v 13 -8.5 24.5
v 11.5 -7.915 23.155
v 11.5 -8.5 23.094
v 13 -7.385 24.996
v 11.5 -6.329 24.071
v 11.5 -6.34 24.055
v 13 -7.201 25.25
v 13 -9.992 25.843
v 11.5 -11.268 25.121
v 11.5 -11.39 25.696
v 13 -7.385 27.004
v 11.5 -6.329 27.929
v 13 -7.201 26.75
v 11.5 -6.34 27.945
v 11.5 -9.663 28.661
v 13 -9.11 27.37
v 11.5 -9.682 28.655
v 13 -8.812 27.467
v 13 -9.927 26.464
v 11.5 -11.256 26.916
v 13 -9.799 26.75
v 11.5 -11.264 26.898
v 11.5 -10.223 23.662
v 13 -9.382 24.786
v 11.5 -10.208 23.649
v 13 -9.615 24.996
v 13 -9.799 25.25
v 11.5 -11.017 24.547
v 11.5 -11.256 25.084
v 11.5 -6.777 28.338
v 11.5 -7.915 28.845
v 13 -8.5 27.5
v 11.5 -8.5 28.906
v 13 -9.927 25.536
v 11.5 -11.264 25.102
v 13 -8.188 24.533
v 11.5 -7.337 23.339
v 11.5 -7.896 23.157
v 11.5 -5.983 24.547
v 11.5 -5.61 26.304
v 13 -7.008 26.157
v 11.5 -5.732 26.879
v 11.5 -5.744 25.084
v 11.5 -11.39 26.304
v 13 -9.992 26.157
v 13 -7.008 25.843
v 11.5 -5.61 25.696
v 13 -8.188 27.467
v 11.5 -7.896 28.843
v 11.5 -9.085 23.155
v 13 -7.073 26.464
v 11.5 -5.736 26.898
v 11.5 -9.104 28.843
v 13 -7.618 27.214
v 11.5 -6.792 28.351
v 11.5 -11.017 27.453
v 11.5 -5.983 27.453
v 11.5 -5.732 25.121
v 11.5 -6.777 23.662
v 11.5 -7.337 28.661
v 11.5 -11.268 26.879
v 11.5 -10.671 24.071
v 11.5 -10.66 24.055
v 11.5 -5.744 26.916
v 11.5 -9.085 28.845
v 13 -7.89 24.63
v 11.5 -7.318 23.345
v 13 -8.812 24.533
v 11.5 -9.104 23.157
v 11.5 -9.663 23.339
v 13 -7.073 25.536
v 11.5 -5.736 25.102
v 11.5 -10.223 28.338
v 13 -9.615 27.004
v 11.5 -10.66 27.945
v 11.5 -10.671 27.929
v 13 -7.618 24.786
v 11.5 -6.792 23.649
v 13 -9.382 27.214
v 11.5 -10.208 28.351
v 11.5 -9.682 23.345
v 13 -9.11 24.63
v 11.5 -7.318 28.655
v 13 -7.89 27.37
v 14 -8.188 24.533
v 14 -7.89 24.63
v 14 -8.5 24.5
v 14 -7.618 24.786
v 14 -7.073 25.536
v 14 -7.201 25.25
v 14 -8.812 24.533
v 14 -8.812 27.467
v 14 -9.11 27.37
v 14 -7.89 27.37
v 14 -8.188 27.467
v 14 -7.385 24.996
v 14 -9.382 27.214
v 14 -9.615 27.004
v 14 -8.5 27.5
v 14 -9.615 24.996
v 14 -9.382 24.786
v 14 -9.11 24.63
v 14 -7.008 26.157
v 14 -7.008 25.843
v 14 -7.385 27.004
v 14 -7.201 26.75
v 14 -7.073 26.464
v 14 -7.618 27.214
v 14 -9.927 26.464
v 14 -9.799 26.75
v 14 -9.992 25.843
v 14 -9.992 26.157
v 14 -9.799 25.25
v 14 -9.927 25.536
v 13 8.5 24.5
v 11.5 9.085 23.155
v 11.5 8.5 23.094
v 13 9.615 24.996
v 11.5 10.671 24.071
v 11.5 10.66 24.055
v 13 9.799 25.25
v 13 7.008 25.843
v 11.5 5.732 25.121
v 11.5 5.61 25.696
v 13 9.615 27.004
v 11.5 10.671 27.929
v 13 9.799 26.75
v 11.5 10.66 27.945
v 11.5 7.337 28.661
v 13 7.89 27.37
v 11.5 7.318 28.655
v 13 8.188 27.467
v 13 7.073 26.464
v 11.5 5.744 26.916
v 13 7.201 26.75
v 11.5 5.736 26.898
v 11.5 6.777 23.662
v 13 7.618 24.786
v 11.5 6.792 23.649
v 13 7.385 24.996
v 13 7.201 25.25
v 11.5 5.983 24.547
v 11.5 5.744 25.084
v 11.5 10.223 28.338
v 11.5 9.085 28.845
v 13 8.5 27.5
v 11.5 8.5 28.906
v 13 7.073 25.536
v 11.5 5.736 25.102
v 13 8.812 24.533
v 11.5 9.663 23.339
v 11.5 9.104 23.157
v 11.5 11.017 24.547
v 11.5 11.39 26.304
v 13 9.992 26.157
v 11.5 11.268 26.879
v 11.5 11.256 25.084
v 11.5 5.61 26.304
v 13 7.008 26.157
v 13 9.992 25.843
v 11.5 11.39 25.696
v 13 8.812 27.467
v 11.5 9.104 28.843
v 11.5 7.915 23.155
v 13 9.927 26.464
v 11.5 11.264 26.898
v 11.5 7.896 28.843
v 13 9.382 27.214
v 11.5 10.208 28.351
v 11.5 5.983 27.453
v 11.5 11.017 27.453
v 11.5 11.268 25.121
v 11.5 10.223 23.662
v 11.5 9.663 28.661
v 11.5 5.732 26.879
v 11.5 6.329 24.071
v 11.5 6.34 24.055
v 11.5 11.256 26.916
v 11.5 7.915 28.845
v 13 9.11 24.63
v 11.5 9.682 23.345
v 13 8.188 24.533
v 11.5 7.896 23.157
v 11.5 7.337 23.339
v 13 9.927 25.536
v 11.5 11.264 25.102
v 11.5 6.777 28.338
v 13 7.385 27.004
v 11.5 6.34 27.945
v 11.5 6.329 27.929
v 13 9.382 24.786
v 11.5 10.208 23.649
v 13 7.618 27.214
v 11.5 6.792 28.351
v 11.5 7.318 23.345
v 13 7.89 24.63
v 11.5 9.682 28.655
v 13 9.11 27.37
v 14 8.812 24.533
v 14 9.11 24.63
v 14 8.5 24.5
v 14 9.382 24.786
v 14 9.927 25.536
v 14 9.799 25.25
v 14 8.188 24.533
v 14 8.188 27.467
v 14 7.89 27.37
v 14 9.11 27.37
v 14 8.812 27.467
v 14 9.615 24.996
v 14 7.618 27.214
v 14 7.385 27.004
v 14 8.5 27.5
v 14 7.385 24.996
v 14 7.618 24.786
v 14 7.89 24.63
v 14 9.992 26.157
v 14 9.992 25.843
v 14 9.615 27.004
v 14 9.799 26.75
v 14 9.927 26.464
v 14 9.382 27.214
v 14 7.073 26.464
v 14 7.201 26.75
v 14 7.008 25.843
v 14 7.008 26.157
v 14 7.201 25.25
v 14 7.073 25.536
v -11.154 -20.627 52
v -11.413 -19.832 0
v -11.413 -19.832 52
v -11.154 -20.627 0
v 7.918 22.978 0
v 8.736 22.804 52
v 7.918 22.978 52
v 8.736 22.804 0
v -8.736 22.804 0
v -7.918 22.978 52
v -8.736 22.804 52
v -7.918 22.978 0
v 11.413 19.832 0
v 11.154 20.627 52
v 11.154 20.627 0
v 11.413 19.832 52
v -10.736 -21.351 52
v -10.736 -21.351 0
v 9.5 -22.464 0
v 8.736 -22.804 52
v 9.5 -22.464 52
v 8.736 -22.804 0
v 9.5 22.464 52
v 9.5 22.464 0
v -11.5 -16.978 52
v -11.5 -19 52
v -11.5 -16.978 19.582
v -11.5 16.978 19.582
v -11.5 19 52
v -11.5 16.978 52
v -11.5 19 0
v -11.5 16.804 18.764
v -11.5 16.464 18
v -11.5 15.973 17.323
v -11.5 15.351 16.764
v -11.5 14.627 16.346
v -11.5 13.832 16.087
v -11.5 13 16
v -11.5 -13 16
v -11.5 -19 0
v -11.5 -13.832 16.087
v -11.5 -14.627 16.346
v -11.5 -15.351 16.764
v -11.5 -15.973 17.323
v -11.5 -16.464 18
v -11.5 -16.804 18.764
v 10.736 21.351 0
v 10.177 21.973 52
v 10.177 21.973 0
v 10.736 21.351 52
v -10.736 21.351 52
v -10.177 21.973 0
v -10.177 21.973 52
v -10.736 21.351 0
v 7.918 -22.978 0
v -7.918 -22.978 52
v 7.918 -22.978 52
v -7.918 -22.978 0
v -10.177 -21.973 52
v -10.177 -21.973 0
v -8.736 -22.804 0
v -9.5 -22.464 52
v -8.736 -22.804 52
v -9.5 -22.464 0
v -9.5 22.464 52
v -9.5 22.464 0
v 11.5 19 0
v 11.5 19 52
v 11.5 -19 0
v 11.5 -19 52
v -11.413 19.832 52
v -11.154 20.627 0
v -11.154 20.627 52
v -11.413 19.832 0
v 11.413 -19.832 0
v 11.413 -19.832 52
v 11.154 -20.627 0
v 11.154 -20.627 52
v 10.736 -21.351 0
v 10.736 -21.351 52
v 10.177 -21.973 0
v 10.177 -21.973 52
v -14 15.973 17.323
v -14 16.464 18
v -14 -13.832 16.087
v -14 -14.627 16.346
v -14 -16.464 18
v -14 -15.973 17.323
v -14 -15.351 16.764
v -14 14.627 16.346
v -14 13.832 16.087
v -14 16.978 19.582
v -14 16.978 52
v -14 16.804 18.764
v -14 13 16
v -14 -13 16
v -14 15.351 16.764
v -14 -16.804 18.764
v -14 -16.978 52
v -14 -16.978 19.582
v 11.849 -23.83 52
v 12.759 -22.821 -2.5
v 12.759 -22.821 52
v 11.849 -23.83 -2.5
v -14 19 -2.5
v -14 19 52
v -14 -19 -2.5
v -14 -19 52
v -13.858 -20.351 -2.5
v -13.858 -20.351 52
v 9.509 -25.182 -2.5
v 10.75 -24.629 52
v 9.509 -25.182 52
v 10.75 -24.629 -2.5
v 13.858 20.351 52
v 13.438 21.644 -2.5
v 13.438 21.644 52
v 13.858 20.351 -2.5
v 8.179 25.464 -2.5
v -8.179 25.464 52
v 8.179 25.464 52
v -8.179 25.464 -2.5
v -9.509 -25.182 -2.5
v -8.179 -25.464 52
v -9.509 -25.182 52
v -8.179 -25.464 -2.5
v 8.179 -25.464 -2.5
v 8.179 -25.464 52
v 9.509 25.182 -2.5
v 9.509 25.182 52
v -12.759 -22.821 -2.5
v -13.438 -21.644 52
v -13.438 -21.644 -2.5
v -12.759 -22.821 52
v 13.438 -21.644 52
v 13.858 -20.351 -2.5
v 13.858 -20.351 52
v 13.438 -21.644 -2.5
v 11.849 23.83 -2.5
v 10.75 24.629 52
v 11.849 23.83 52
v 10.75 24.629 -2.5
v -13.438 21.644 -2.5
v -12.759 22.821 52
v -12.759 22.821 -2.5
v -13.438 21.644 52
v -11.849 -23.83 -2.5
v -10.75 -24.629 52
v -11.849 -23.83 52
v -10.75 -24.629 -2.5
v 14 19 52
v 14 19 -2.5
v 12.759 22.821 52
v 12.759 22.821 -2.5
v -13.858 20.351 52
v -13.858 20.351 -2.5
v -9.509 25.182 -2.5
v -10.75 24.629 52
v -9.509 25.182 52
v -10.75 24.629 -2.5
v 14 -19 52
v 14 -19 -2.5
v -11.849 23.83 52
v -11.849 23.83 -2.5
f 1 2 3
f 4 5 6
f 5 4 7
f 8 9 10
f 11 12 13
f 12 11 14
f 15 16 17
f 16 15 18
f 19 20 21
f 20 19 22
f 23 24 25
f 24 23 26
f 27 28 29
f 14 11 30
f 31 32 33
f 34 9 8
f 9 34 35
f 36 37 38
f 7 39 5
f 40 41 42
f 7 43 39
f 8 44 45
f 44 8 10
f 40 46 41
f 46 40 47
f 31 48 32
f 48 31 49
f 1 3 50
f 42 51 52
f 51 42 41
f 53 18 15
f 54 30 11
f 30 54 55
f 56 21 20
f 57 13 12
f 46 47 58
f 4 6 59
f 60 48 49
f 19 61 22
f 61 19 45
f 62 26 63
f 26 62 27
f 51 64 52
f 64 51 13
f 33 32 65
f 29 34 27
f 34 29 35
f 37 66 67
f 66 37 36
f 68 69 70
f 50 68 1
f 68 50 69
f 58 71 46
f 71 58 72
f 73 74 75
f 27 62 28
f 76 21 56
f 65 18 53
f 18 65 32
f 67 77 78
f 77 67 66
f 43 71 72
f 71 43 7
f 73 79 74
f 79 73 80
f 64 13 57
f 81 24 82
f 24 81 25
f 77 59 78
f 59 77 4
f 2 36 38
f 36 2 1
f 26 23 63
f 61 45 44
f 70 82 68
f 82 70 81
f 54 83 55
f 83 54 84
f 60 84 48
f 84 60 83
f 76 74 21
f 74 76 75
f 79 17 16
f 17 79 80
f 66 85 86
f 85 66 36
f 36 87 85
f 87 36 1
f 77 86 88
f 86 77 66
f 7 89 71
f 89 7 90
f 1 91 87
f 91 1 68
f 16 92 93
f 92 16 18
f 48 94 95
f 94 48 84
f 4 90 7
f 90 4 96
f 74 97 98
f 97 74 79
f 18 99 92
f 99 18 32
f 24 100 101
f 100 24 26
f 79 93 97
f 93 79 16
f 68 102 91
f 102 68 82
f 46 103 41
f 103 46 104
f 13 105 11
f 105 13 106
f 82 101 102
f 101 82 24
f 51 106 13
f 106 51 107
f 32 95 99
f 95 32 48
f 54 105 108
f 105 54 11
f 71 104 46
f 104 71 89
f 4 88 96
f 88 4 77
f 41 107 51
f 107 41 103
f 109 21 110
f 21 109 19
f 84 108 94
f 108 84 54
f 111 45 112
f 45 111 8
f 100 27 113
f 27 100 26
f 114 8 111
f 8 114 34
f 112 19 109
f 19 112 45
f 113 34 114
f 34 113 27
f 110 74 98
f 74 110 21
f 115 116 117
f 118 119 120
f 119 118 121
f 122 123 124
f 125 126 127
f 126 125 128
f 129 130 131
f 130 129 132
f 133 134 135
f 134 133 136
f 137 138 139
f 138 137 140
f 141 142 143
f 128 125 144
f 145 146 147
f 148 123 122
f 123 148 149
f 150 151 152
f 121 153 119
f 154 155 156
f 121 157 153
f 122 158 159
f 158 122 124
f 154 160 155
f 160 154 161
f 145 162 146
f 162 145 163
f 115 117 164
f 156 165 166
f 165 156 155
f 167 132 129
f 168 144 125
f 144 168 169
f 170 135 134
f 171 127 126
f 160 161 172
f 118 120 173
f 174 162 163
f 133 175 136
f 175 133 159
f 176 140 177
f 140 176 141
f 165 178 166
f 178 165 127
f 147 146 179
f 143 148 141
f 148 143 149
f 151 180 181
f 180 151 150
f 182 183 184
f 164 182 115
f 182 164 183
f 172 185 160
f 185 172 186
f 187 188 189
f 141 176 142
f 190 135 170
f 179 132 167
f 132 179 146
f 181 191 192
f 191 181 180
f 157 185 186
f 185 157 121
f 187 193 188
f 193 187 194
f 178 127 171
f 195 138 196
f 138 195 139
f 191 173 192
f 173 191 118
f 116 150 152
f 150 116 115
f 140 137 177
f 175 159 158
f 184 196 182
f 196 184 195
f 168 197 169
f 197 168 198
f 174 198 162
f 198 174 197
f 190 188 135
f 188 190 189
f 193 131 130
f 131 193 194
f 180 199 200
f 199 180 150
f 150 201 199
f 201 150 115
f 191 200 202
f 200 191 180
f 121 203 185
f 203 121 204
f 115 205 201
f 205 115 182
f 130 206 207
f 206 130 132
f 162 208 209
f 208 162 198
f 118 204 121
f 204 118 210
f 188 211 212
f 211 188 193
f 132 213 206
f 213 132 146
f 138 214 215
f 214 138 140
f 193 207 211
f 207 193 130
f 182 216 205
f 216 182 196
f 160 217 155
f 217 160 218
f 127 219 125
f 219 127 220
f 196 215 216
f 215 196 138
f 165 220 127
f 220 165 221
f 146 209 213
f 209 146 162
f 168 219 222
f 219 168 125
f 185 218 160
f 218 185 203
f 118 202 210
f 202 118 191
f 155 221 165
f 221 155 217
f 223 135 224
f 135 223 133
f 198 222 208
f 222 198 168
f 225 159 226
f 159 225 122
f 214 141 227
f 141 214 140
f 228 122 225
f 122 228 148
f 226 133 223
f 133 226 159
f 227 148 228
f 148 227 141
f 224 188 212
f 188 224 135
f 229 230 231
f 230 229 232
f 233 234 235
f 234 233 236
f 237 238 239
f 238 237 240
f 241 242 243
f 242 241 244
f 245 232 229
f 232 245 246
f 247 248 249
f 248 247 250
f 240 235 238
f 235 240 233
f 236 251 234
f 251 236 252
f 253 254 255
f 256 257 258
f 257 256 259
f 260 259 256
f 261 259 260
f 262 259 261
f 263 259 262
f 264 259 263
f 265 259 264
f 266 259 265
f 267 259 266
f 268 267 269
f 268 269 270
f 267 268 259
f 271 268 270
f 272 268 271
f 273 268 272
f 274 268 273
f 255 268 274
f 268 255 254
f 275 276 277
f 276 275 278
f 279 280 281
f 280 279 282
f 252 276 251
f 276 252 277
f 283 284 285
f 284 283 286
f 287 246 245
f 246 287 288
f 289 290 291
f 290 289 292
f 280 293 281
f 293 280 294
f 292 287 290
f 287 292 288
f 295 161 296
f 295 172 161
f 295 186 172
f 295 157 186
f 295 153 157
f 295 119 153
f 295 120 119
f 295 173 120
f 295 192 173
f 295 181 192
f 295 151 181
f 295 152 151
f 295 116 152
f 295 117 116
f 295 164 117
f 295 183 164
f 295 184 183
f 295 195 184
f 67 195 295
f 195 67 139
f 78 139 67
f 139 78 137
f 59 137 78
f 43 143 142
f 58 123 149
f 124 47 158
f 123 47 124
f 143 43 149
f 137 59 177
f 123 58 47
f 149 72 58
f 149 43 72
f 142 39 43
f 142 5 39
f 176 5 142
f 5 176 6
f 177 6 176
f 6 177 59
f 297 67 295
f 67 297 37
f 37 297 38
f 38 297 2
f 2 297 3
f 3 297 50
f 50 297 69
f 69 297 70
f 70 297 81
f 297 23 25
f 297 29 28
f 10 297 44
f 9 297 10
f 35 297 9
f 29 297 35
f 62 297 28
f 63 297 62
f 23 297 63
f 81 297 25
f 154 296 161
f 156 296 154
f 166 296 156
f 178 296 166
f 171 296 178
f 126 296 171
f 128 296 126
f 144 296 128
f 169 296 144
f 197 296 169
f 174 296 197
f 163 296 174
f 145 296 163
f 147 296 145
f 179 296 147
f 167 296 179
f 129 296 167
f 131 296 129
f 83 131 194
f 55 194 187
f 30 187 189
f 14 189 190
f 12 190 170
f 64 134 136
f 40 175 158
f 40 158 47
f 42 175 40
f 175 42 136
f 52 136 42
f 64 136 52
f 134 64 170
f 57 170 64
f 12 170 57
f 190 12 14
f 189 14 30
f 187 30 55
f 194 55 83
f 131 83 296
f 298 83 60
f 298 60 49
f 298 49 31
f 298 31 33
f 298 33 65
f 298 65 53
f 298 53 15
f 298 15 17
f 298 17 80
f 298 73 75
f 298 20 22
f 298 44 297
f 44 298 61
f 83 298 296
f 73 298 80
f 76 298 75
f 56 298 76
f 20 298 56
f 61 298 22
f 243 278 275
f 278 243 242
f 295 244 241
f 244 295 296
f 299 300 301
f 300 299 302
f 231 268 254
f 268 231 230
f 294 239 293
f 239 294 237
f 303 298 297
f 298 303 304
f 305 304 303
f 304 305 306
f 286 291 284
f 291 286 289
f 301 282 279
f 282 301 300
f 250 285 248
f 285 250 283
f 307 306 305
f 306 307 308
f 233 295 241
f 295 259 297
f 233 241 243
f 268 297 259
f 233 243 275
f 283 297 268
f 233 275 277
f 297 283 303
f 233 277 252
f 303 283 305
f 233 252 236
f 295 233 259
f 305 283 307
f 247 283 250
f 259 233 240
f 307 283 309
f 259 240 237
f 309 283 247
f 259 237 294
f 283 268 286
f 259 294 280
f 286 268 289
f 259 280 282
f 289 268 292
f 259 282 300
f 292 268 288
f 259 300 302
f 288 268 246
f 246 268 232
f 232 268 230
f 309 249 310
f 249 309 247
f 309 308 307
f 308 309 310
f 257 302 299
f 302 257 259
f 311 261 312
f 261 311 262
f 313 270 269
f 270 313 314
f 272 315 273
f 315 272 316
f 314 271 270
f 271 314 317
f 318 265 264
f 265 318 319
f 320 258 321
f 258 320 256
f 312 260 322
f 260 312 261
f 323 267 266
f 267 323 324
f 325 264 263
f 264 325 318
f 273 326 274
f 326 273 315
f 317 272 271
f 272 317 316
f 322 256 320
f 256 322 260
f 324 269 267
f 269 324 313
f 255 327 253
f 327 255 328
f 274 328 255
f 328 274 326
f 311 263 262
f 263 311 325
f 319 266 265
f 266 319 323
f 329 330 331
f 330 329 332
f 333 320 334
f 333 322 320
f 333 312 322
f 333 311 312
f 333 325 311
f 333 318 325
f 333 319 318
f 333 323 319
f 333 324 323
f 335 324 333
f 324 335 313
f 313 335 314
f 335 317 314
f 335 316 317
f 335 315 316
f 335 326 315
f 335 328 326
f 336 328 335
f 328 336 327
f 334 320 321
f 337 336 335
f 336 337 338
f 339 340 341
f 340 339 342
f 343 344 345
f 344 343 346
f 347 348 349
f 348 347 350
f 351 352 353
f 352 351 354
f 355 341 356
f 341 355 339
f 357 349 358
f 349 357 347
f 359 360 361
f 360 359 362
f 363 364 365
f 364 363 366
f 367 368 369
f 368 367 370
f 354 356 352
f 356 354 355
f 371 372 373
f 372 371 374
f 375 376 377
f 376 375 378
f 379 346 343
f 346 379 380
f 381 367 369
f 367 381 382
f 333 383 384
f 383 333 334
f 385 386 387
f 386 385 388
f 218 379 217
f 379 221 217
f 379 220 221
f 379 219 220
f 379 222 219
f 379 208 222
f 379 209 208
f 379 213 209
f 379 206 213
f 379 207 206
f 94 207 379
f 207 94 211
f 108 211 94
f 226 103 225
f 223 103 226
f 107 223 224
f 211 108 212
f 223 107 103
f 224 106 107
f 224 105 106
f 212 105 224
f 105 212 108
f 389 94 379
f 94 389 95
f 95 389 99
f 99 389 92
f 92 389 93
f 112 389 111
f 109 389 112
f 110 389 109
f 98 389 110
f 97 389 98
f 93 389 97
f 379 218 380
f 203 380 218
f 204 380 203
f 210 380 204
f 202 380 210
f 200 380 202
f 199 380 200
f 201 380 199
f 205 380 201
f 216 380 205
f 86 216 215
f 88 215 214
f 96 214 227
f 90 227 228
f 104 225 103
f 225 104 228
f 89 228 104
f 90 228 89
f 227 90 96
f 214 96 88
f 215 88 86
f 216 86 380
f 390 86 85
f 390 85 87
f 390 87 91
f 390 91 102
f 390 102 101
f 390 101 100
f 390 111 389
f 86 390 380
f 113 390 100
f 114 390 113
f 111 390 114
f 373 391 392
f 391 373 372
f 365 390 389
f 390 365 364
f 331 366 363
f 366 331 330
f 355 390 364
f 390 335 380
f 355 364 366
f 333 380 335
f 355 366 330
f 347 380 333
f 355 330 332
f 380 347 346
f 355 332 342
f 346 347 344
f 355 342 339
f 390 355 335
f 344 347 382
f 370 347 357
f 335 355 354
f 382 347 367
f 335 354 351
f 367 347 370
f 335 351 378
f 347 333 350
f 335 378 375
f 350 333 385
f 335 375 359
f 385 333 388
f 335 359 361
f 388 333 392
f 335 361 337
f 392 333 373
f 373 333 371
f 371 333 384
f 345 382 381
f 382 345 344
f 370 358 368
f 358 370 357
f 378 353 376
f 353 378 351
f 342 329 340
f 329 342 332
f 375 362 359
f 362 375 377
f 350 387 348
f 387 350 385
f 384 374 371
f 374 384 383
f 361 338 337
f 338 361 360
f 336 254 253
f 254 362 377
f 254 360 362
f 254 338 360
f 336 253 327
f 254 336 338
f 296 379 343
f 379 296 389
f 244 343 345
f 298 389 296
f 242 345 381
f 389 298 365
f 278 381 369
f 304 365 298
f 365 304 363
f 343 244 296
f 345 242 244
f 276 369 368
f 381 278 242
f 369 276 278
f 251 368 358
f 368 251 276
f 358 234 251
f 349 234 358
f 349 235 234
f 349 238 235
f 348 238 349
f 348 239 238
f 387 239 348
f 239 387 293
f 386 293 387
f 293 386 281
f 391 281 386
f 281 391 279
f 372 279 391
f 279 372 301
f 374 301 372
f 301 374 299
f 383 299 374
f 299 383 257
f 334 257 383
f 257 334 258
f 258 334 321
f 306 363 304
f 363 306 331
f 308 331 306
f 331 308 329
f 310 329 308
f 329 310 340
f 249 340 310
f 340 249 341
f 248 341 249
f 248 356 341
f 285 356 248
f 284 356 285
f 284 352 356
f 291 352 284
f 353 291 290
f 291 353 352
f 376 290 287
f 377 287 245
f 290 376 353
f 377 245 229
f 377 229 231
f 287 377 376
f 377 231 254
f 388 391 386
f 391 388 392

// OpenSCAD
//
//  wall holder for aircond remote control
//
//  design by egil kvaleberg, 5 october 2016
//
//  added support for chamfer
//

// size of compartment
comp_w = 46;
comp_d = 23;
comp_h = 52;
// width of front slot
slot_w = 34;
// width of slot lower lip
slot_lower = 16; 
// corner radius of compartment
corner_r = 4;
// wall thickness of comparement
wall = 2.5;
// chamfer for top entry and bottom (typical value is 0.6)
chamfer = 0.0; // [0.0:0.1:2.0]
// diameter of mounting screws
mnt_dia = 2.5;

// generic tolerance
tol = 0.25;

d = 1*0.1;

module add() {
    // chamfered bottom section
    if (chamfer > 0) hull() for (sx = [-1,1]) for (sy = [-1,1]) 
        translate([sx*(comp_d/2-corner_r),sy*(comp_w/2-corner_r),-wall]) {
            cylinder(r1=wall+corner_r-chamfer, r2=wall+corner_r, h=chamfer, $fn=30);
        }   
    // main section    
    hull() for (sx = [-1,1]) for (sy = [-1,1]) 
        translate([sx*(comp_d/2-corner_r),sy*(comp_w/2-corner_r),chamfer-wall]) {
            cylinder(r=wall+corner_r, h=wall+comp_h-chamfer, $fn=30);
        }   
}

module sub() {
    // main compartment 
    hull () for (sx = [-1,1]) for (sy = [-1,1]) 
        translate([sx*(comp_d/2-corner_r),sy*(comp_w/2-corner_r),0]) {
            cylinder(r=corner_r, h=comp_h+d, $fn=30);
    }
    // main compartment, chamfered section
    if (chamfer > 0) hull () for (sx = [-1,1]) for (sy = [-1,1]) 
        translate([sx*(comp_d/2-corner_r),sy*(comp_w/2-corner_r),comp_h-chamfer]) {
            translate([0,0,]) cylinder(r1=corner_r, r2=corner_r+chamfer+d, h=chamfer+d, $fn=30);
    }
    // slot in front
    translate ([0,0,slot_lower+comp_h/2]) rotate([0,-90,0]) hull () for (sx = [-1,1]) for (sy = [-1,1]) 
        translate([sx*(comp_h/2-corner_r),sy*(slot_w/2-corner_r),0]) {
            cylinder(r=corner_r, h=comp_h+d, $fn=30);
    }
    // mounting holes
    translate ([comp_d/2-d,0,comp_h/2]) rotate([0,90,0]) for (sy = [-1,1]) 
        translate([0,sy*slot_w/4,0]) {
            cylinder(d1=mnt_dia+2*tol+2*wall*0.6, d2=mnt_dia+2*tol, h=d+wall*0.6, $fn=30);
            cylinder(d=mnt_dia+2*tol, h=d+wall+d, $fn=30);
    }   
}
    // mounting holes
    if (0) color("red") translate ([comp_d/2-d,0,comp_h/2]) rotate([0,90,0]) for (sy = [-1,1]) 
        translate([0,sy*slot_w/4,0]) {
            cylinder(d=mnt_dia+2*tol, h=d+wall+d, $fn=30);
    } 

    // main structure:
    difference () {
        color("red") add();
        difference () {
            sub();
            //
        }
    }
